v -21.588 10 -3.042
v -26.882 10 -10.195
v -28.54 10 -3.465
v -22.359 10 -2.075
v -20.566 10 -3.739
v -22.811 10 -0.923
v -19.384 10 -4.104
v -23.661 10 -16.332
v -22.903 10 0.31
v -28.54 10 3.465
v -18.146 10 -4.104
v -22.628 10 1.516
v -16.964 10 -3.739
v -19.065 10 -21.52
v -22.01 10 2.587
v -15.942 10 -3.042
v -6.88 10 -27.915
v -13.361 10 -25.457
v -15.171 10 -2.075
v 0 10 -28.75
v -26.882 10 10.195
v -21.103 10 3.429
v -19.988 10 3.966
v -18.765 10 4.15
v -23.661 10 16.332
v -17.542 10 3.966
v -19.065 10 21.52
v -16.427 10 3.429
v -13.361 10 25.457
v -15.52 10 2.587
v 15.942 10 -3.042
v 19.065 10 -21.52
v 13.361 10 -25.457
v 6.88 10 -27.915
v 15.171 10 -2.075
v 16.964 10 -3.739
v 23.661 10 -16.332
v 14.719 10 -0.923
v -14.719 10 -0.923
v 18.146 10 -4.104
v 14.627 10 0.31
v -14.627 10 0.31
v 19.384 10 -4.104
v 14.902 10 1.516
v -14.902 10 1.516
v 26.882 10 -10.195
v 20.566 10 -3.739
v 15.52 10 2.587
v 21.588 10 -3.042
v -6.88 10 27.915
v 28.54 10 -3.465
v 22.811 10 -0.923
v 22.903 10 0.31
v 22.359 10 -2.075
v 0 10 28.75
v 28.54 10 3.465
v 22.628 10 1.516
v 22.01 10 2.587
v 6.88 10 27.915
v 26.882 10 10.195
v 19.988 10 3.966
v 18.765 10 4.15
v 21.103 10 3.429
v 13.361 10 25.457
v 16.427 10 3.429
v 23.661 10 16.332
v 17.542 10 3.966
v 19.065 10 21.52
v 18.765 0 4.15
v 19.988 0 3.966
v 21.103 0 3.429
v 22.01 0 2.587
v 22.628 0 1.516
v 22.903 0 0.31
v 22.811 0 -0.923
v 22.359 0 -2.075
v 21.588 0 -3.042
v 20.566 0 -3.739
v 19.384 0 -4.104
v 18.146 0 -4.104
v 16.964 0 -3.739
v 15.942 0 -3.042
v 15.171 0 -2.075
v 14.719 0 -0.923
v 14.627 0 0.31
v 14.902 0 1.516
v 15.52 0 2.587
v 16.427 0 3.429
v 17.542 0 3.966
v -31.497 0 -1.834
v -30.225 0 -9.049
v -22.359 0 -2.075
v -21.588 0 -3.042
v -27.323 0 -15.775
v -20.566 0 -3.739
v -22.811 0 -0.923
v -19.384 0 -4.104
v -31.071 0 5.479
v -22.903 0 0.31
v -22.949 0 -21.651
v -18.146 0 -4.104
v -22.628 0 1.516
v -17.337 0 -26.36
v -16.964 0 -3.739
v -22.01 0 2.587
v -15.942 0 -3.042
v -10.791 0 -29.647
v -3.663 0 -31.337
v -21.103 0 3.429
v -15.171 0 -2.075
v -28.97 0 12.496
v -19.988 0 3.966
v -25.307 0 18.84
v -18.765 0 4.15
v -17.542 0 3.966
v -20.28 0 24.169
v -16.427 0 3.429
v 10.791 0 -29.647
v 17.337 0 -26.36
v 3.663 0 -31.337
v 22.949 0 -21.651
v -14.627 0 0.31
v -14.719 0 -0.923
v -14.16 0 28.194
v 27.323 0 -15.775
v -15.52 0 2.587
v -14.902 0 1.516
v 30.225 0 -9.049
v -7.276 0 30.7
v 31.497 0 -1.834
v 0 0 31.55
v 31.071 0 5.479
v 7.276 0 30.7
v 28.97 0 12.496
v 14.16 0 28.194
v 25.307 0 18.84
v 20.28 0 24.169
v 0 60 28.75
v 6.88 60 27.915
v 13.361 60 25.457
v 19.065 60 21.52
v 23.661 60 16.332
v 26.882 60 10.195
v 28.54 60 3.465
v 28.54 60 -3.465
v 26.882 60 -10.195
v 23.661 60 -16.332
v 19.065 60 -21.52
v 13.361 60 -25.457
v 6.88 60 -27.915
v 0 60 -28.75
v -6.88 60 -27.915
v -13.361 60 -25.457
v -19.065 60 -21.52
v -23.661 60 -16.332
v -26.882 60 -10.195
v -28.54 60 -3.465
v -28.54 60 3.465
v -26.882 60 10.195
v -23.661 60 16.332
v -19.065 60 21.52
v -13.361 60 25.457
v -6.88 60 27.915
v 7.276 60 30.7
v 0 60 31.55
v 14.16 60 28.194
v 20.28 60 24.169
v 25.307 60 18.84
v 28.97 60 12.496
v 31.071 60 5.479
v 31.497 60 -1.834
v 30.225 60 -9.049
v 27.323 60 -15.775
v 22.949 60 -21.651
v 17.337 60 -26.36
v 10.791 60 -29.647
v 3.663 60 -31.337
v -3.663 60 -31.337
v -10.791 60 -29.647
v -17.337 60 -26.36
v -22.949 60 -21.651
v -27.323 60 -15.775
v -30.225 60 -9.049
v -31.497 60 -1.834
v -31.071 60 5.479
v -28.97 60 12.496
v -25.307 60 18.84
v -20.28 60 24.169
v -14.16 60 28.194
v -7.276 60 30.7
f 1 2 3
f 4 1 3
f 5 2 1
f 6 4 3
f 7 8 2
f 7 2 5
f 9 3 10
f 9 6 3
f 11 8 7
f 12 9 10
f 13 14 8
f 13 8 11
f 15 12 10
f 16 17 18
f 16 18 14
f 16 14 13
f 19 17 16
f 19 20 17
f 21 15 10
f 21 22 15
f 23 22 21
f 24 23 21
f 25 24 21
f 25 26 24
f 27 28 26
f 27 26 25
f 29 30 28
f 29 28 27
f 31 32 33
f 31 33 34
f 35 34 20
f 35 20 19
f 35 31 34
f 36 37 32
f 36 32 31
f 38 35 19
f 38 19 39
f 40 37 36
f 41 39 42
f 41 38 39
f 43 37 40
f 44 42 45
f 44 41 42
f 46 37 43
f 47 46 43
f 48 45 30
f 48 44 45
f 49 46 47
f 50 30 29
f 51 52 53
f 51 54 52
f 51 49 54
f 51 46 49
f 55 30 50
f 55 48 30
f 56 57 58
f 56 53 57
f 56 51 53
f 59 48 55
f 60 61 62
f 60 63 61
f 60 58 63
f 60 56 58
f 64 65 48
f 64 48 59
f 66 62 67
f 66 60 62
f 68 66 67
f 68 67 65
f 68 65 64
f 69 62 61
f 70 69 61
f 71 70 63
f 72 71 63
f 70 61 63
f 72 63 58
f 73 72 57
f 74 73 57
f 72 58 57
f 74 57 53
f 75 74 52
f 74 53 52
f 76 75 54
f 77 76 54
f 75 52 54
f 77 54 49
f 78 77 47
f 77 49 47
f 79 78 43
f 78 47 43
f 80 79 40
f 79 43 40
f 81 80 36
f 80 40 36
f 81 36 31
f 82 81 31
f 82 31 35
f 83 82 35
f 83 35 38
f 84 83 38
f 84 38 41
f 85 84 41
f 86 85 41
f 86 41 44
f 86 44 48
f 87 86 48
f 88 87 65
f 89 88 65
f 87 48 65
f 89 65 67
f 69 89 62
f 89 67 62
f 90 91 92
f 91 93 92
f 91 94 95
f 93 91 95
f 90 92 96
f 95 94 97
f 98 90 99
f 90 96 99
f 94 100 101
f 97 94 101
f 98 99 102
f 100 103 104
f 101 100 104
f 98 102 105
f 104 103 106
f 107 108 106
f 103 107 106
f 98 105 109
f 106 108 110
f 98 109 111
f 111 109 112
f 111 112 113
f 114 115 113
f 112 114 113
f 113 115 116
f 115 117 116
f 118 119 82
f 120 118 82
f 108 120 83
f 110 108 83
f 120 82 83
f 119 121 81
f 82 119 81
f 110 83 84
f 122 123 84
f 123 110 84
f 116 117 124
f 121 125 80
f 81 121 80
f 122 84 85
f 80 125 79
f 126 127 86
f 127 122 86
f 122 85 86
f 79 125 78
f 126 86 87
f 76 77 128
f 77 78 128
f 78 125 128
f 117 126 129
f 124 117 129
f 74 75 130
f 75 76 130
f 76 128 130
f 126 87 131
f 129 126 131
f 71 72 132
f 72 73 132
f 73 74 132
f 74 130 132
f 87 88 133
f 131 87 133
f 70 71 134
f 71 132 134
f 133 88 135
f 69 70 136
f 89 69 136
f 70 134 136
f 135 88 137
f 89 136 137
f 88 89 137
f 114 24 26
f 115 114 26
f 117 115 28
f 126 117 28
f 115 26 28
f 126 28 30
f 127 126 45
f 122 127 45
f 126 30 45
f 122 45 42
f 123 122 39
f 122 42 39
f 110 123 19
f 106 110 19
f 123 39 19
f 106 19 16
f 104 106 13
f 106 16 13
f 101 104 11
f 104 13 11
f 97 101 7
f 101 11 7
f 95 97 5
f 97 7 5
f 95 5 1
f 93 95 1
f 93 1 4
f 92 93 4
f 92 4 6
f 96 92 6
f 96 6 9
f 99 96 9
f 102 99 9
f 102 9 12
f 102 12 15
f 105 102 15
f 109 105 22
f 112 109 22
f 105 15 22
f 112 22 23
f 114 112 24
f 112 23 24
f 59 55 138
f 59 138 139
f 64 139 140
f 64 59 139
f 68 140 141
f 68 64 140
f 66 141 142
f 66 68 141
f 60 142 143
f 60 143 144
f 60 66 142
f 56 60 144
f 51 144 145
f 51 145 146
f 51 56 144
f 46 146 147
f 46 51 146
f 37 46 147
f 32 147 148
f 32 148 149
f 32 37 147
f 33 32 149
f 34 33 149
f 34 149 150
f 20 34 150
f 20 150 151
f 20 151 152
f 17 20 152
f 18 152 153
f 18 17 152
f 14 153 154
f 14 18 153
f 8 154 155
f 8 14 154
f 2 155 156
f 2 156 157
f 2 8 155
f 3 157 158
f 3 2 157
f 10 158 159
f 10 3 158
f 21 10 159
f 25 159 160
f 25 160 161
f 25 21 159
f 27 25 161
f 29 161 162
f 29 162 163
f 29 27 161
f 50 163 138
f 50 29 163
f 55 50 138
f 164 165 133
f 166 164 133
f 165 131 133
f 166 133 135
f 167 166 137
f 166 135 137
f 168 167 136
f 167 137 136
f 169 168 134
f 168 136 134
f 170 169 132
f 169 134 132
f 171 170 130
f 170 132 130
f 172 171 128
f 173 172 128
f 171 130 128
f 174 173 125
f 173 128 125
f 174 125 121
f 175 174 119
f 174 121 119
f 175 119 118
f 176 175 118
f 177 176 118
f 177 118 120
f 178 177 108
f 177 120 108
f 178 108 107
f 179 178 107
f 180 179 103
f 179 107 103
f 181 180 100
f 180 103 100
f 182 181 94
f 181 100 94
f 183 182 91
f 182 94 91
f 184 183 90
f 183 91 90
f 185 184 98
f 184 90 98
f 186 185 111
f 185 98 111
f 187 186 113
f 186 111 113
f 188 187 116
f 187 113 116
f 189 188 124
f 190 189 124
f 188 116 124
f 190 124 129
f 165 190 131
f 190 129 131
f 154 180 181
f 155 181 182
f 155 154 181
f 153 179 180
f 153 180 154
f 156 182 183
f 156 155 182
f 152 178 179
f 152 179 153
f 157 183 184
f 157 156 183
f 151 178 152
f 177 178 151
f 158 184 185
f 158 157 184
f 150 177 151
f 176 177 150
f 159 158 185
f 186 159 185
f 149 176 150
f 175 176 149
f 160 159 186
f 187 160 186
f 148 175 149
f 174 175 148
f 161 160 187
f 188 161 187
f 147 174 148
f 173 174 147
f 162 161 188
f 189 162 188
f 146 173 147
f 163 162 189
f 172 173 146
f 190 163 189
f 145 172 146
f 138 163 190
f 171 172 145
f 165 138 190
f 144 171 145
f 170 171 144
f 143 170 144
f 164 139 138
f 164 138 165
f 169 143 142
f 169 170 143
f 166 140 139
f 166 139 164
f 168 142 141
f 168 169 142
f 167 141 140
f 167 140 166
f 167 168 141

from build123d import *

# Parameters (mm, degrees)
SKETCH1_R           = 31.55
BOSS_EXTRUDE1_DEPTH = 10
SKETCH3_R           = 4.15
CUT_EXTRUDE1_DEPTH  = 10
SKETCH5_R           = 31.55
SKETCH5_R_2         = 28.75
BOSS_EXTRUDE2_DEPTH = 50


with BuildPart() as part:
    # Sketch1 → Boss-Extrude1 (new body)
    with BuildSketch(Plane(origin=(0, 0, 0), x_dir=(1, 0, 0), z_dir=(0, 1, 0))):
        with Locations(Location((0, 0, 0), (0, 0, 270))):
            Circle(SKETCH1_R)
    extrude(amount=BOSS_EXTRUDE1_DEPTH)

    # Sketch3 → Cut-Extrude1 (cut)
    with BuildSketch(Plane(origin=(0, 10, 0), x_dir=(1, 0, 0), z_dir=(0, 1, 0))):
        with Locations(Location((-18.765, 0, 0), (0, 0, 270))):
            Circle(SKETCH3_R)
        with Locations(Location((18.765, 0, 0), (0, 0, 270))):
            Circle(SKETCH3_R)
    extrude(amount=-CUT_EXTRUDE1_DEPTH, mode=Mode.SUBTRACT)

    # Sketch5 → Boss-Extrude2 (add)
    with BuildSketch(Plane(origin=(0, 10, 0), x_dir=(1, 0, 0), z_dir=(0, 1, 0))):
        with Locations(Location((0, 0, 0), (0, 0, 270))):
            Circle(SKETCH5_R)
        with Locations(Location((0, 0, 0), (0, 0, 270))):
            Circle(SKETCH5_R_2, mode=Mode.SUBTRACT)
    extrude(amount=BOSS_EXTRUDE2_DEPTH)


solid = part.part
